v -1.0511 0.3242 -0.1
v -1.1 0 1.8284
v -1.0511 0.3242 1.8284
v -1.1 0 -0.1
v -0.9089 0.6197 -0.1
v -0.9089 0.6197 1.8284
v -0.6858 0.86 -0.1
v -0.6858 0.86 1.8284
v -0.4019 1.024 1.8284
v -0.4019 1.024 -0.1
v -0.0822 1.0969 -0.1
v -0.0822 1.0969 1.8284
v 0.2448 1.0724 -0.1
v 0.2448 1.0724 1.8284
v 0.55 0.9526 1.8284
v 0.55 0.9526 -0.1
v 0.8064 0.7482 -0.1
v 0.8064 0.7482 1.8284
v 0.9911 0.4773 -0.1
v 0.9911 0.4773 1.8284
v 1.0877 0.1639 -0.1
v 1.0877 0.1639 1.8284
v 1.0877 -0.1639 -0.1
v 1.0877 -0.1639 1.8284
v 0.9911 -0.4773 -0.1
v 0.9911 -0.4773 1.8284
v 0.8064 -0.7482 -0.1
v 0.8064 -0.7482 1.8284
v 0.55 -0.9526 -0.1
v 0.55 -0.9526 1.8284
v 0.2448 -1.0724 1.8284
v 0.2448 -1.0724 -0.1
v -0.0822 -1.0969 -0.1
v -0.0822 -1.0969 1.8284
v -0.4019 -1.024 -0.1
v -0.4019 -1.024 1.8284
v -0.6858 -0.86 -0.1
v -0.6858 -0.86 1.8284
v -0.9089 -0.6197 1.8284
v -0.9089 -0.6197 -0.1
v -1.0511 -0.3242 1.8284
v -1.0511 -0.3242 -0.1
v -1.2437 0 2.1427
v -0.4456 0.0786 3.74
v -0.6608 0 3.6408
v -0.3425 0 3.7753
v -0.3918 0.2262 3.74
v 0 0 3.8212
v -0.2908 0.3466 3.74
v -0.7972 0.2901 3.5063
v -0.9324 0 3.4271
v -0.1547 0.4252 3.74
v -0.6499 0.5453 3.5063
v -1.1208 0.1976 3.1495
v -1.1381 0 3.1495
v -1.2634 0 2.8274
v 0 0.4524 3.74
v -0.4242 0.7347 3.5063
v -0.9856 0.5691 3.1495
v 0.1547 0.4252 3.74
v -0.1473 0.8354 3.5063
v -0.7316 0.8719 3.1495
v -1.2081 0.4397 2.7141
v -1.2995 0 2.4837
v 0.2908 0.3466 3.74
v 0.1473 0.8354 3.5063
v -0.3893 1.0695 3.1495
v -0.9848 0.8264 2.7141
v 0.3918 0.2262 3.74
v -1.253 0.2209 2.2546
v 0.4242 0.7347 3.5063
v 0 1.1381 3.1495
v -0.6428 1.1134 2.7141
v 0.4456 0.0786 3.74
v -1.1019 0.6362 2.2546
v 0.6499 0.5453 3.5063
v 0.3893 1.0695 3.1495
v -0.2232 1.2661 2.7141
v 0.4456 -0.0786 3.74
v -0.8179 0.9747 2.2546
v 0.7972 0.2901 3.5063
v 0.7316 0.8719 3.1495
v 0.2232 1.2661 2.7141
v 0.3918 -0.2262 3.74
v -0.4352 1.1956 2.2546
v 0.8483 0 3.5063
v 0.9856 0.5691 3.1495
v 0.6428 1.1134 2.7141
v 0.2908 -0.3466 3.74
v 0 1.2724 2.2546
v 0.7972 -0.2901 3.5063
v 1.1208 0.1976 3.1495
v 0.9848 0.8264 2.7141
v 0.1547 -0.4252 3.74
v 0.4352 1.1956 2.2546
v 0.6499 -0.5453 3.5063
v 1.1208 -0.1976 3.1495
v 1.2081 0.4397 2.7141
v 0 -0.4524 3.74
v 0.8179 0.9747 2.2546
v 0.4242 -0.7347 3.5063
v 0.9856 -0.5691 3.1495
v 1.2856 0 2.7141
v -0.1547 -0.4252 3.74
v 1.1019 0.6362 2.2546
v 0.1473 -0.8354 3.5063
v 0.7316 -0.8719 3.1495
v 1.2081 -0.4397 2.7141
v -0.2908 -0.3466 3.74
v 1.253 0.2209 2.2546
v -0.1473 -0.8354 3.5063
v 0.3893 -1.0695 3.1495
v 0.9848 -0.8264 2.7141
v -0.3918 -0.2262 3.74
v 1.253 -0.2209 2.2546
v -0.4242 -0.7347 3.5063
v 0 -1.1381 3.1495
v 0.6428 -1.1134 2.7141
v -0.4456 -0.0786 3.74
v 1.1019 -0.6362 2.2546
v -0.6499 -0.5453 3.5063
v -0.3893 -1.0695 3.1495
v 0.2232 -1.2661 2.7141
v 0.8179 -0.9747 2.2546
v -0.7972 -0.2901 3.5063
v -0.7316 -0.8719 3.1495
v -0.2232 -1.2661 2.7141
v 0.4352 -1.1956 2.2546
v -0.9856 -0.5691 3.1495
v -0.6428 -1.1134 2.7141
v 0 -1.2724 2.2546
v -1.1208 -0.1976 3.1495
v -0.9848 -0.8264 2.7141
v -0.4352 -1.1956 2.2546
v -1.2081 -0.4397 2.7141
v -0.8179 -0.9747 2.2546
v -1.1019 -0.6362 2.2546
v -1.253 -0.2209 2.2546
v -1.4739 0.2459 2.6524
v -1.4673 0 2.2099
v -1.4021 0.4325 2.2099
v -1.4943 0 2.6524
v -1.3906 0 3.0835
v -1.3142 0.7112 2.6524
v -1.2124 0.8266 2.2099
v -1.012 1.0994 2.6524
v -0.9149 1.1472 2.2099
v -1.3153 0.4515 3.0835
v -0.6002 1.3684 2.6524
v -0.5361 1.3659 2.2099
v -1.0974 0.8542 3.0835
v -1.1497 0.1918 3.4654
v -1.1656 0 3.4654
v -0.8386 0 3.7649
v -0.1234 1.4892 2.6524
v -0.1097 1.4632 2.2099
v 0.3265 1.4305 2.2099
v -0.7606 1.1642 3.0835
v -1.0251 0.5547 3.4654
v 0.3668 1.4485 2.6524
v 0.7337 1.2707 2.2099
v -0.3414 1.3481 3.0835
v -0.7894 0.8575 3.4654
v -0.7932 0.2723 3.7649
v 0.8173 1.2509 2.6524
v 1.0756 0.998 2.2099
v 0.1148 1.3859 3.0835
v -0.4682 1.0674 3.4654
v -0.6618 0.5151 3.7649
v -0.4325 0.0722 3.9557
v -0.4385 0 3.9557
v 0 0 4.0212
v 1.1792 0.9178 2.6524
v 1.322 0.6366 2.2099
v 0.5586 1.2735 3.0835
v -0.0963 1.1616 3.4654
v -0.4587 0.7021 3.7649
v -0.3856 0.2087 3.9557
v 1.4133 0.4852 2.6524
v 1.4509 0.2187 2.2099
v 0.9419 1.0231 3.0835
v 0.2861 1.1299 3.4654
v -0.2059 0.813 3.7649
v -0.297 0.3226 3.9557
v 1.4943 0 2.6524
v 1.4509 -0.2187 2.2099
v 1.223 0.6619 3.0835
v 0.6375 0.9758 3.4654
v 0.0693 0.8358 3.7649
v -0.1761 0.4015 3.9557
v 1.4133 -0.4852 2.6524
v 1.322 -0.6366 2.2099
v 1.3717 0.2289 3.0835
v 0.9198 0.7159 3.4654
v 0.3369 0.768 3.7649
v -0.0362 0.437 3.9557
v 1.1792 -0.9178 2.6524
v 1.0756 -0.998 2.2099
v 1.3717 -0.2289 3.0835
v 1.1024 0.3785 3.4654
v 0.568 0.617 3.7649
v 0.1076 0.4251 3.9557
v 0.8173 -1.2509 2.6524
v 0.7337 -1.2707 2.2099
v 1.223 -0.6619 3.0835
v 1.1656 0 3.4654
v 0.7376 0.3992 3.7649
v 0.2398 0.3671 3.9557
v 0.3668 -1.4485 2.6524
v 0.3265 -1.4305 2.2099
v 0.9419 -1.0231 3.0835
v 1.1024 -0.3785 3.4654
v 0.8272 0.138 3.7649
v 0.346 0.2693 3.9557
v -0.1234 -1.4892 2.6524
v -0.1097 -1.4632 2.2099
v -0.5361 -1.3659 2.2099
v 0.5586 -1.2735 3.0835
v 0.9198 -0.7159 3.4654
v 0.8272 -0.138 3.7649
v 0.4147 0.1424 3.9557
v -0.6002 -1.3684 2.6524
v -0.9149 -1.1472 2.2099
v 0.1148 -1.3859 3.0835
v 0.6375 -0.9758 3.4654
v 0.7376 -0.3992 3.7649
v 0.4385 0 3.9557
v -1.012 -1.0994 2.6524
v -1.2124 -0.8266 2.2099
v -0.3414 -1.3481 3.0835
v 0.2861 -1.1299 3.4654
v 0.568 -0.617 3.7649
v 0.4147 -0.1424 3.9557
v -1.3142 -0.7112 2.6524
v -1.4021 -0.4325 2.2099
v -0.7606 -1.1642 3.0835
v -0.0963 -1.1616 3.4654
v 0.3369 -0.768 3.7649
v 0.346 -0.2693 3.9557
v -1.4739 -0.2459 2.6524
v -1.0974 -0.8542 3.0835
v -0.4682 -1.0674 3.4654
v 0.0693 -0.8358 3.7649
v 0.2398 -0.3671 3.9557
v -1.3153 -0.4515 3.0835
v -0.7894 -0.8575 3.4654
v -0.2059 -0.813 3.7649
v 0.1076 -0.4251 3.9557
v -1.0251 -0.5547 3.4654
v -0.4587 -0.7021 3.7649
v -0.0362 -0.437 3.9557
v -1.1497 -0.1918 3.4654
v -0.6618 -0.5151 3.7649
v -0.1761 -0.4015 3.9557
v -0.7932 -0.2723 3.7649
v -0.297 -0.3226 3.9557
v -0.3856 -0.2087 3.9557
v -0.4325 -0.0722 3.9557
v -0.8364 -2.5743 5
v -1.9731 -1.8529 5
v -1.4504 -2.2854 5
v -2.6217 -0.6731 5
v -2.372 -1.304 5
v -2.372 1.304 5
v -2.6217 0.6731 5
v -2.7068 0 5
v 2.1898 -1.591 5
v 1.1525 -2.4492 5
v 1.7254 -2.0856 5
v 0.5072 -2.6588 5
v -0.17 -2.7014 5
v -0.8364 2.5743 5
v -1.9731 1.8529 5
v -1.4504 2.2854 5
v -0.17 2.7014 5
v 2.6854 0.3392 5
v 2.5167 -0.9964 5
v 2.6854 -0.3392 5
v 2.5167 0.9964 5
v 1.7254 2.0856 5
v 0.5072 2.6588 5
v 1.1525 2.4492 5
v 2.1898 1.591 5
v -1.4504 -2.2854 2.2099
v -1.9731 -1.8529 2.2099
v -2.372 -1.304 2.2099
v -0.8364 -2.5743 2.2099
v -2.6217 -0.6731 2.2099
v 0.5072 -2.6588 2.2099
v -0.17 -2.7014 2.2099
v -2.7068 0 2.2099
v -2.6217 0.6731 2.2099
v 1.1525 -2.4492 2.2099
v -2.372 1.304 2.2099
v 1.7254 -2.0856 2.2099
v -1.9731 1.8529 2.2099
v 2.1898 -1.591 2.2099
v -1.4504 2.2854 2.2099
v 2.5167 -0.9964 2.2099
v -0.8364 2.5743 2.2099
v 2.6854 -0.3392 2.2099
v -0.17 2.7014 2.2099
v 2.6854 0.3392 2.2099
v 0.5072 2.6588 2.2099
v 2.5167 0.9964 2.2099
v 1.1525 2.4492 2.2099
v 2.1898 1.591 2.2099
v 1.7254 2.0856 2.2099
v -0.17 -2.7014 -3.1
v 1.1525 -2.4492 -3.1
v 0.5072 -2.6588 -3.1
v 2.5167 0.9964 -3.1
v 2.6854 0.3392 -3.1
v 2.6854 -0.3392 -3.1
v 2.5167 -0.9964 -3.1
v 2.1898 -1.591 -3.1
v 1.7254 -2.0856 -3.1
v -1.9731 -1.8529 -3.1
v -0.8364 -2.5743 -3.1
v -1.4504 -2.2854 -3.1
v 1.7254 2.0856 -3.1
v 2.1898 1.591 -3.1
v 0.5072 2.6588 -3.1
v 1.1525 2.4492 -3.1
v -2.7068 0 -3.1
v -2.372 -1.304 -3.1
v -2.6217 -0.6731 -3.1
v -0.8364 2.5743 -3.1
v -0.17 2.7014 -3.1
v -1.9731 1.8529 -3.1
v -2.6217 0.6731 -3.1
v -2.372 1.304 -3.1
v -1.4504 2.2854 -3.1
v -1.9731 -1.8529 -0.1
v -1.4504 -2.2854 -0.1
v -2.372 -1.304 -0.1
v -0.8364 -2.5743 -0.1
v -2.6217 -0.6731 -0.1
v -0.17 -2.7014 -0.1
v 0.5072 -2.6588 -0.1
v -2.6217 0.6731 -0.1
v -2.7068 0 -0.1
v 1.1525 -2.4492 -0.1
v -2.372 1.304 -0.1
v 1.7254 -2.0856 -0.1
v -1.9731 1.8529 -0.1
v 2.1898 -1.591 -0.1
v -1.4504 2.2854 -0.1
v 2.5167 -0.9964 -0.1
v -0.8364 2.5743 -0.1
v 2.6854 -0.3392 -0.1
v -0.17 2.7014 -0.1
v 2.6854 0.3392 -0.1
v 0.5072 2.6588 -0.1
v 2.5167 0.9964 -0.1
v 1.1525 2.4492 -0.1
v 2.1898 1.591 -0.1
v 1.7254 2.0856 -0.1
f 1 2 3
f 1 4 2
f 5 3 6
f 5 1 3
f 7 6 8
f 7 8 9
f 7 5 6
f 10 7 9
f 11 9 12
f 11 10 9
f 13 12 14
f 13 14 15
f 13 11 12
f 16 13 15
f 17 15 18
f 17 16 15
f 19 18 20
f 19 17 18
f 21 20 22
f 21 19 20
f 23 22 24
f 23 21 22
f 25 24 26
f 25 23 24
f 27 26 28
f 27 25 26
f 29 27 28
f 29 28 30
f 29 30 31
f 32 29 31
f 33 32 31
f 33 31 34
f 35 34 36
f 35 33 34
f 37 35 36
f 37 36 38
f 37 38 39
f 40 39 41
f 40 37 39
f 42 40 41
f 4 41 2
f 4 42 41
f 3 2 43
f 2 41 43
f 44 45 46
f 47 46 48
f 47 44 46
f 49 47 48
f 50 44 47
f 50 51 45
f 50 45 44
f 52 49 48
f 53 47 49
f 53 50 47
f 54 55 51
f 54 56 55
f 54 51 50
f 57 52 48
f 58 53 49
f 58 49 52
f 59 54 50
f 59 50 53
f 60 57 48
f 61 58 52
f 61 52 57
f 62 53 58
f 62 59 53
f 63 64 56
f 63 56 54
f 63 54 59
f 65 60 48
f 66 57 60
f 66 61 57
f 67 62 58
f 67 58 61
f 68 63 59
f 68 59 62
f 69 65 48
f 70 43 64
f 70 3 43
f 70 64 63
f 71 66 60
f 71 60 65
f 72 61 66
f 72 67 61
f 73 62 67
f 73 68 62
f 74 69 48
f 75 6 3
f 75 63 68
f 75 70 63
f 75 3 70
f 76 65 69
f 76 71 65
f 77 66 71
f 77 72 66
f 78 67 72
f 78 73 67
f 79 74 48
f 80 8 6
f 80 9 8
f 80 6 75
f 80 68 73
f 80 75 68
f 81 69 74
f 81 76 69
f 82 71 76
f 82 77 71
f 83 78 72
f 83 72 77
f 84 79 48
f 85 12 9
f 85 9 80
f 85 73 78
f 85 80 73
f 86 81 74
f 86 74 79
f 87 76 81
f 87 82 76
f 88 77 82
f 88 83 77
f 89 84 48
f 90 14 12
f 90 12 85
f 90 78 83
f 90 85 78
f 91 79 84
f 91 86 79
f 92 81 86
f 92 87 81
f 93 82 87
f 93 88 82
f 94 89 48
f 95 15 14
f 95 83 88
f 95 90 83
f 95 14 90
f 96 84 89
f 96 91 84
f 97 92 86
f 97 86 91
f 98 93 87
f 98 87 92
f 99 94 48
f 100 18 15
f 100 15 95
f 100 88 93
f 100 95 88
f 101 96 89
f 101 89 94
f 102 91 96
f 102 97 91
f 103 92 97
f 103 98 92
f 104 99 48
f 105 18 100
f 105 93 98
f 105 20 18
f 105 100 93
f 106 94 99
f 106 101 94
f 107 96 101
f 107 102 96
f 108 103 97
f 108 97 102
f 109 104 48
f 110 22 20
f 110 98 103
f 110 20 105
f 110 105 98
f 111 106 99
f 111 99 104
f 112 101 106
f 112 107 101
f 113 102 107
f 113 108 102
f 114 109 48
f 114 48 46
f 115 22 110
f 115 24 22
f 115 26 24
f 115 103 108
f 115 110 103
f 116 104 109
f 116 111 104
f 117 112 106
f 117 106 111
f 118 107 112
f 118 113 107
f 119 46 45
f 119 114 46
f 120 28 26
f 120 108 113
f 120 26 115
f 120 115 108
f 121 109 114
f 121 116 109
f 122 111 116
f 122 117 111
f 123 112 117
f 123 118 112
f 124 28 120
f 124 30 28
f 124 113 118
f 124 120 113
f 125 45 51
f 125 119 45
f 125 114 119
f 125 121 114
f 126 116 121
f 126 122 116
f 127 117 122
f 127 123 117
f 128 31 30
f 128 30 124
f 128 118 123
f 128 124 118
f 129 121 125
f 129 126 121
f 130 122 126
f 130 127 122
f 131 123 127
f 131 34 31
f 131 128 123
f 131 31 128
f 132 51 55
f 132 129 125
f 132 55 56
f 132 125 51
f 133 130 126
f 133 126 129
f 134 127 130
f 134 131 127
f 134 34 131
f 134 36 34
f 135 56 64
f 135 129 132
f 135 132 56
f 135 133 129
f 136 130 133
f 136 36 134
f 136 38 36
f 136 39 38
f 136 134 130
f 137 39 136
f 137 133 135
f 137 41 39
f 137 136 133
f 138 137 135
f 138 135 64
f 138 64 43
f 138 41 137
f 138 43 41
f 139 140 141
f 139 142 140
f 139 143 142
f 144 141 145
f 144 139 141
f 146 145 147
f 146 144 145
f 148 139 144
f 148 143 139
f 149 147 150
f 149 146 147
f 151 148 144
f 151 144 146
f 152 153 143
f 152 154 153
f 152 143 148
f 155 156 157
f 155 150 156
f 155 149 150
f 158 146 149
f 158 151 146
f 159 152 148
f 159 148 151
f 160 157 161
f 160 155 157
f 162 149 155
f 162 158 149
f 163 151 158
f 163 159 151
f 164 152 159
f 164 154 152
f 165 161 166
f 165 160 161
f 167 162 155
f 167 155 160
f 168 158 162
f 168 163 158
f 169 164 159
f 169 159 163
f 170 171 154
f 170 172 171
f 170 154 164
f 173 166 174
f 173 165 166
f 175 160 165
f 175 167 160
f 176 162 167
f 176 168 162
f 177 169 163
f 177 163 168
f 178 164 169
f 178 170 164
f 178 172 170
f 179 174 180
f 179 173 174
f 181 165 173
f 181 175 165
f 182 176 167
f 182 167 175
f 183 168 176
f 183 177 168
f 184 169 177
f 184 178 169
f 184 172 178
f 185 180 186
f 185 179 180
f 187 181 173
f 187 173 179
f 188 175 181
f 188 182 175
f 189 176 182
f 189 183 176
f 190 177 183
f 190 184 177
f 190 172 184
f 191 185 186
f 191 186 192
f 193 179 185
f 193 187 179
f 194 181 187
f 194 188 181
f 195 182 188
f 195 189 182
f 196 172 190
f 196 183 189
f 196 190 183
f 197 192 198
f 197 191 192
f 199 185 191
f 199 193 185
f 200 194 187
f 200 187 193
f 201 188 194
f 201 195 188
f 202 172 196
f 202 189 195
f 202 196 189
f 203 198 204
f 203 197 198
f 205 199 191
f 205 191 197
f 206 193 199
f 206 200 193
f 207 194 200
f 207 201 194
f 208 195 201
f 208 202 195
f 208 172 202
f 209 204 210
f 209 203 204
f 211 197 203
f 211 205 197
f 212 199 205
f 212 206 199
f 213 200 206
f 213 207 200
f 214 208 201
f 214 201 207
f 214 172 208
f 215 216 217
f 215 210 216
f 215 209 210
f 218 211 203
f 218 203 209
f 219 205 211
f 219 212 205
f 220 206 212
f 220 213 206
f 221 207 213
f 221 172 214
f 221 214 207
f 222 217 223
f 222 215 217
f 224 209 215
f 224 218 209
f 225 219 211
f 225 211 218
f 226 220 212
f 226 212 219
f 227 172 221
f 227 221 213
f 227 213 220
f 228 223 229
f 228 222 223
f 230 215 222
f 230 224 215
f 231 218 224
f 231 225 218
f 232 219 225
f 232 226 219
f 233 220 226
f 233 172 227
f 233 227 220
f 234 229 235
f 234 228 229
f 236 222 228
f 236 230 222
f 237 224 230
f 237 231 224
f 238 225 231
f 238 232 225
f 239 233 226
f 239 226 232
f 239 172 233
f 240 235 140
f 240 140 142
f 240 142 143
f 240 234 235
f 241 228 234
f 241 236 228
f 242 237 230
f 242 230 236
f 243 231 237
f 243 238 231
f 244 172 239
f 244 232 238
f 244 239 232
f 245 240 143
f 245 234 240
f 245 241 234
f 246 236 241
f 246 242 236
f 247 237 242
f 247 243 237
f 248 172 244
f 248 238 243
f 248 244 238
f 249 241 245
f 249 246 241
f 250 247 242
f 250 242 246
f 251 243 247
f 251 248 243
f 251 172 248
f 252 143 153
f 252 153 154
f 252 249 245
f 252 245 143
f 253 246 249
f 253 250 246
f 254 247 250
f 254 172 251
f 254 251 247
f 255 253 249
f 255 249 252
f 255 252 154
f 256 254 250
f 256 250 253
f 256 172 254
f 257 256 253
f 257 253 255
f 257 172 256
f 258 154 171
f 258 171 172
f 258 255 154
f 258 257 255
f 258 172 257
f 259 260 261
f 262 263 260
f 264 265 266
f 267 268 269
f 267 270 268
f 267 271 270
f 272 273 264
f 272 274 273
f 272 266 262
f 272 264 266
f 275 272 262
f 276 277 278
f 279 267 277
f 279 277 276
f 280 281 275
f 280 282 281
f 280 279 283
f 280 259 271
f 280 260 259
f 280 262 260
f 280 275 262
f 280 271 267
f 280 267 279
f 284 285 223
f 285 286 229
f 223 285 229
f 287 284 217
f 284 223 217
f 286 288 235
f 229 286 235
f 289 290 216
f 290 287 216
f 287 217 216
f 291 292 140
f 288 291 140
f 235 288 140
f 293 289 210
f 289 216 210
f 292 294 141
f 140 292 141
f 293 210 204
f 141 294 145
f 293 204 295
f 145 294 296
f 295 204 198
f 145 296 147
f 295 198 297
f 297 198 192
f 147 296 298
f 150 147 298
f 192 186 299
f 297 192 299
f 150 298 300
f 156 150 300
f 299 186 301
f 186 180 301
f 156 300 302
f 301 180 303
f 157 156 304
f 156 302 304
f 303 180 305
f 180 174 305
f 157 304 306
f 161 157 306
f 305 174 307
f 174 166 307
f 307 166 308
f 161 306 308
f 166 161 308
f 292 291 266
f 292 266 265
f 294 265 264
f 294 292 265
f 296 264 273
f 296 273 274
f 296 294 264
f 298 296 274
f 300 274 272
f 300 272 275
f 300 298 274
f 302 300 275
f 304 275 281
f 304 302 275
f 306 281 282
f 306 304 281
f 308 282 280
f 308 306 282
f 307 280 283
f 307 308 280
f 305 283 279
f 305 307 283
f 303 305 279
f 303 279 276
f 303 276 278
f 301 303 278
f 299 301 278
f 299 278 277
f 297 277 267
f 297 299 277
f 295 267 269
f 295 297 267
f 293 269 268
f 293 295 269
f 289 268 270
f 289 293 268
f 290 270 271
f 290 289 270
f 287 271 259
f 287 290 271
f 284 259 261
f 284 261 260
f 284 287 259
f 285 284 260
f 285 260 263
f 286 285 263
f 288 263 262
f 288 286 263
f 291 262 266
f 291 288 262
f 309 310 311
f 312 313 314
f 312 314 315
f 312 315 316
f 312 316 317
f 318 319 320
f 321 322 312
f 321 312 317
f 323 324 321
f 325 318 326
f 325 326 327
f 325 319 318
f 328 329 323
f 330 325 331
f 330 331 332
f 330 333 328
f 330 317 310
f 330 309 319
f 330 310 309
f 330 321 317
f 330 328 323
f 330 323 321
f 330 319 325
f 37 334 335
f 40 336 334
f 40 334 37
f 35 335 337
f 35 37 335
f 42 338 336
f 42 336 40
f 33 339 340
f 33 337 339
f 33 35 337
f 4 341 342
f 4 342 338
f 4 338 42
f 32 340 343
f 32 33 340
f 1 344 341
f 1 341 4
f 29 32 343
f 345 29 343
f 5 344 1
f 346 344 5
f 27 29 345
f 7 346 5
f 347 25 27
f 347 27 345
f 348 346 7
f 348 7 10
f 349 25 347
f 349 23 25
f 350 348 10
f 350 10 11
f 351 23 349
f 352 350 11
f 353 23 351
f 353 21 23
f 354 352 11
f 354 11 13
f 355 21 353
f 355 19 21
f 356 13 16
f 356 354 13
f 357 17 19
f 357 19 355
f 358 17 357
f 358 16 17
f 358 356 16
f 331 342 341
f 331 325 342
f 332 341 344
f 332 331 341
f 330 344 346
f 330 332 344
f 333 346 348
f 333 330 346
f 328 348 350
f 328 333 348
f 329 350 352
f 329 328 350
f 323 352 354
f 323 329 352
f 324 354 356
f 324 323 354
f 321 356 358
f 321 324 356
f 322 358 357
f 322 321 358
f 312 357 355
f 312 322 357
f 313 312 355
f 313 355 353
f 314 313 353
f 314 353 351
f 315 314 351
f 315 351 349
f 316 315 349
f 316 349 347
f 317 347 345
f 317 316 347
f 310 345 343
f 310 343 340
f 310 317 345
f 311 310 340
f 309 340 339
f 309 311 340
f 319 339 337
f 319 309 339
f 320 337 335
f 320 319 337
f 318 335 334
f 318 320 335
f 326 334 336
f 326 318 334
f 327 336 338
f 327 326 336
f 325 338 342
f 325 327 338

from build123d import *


with BuildPart() as f1:
    # F0 (on Front) → F1 (revolve)
    with BuildSketch(Plane.XZ):
        with BuildLine():
            ThreePointArc((-1.3, 1.772904835), (-1.2985563553, 3.2720701102), (0, 4.0212363124))
            Line((0, 4.0212363124), (0, 5))
            Line((0, 5), (-2.7067668361, 5))
            Line((-2.7067668361, 5), (-2.7067668361, 0))
            Line((-2.7067668361, 0), (-1.3, 0))
            Line((-1.3, 0), (-1.3, 1.772904835))
        make_face()
    revolve(axis=Axis((0, 0, 4.5106181562), (0, 0, -1)))

    # F4 (on Front) → F5 (revolve, cut)
    with BuildSketch(Plane.XZ):
        Polygon((0, 2.2098657209), (-1.4926502481, 2.2098657209), (-2.730937209, 2.2098657209), (-2.730937209, 0), (0, 0), align=None)
    revolve(axis=Axis((0, 0, 5), (0, 0, -1)), mode=Mode.SUBTRACT)


with BuildPart() as f3:
    # F2 (on Front) → F3 (revolve)
    with BuildSketch(Plane.XZ):
        with BuildLine():
            ThreePointArc((0, 3.8212363124), (-1.1381270623, 3.1494614233), (-1.1, 1.8284159893))
            Line((-1.1, 1.8284159893), (-1.1, -0.1))
            Line((-1.1, -0.1), (-2.7067668361, -0.1))
            Line((-2.7067668361, -0.1), (-2.7067668361, -3.1))
            Line((-2.7067668361, -3.1), (0, -3.1))
            Line((0, -3.1), (0, 0.2588959377))
            Line((0, 0.2588959377), (0, 3.8212363124))
        make_face()
    revolve(axis=Axis((0, 0, 0.3606181562), (0, 0, -1)))


solid = Compound([f1.part, f3.part])
